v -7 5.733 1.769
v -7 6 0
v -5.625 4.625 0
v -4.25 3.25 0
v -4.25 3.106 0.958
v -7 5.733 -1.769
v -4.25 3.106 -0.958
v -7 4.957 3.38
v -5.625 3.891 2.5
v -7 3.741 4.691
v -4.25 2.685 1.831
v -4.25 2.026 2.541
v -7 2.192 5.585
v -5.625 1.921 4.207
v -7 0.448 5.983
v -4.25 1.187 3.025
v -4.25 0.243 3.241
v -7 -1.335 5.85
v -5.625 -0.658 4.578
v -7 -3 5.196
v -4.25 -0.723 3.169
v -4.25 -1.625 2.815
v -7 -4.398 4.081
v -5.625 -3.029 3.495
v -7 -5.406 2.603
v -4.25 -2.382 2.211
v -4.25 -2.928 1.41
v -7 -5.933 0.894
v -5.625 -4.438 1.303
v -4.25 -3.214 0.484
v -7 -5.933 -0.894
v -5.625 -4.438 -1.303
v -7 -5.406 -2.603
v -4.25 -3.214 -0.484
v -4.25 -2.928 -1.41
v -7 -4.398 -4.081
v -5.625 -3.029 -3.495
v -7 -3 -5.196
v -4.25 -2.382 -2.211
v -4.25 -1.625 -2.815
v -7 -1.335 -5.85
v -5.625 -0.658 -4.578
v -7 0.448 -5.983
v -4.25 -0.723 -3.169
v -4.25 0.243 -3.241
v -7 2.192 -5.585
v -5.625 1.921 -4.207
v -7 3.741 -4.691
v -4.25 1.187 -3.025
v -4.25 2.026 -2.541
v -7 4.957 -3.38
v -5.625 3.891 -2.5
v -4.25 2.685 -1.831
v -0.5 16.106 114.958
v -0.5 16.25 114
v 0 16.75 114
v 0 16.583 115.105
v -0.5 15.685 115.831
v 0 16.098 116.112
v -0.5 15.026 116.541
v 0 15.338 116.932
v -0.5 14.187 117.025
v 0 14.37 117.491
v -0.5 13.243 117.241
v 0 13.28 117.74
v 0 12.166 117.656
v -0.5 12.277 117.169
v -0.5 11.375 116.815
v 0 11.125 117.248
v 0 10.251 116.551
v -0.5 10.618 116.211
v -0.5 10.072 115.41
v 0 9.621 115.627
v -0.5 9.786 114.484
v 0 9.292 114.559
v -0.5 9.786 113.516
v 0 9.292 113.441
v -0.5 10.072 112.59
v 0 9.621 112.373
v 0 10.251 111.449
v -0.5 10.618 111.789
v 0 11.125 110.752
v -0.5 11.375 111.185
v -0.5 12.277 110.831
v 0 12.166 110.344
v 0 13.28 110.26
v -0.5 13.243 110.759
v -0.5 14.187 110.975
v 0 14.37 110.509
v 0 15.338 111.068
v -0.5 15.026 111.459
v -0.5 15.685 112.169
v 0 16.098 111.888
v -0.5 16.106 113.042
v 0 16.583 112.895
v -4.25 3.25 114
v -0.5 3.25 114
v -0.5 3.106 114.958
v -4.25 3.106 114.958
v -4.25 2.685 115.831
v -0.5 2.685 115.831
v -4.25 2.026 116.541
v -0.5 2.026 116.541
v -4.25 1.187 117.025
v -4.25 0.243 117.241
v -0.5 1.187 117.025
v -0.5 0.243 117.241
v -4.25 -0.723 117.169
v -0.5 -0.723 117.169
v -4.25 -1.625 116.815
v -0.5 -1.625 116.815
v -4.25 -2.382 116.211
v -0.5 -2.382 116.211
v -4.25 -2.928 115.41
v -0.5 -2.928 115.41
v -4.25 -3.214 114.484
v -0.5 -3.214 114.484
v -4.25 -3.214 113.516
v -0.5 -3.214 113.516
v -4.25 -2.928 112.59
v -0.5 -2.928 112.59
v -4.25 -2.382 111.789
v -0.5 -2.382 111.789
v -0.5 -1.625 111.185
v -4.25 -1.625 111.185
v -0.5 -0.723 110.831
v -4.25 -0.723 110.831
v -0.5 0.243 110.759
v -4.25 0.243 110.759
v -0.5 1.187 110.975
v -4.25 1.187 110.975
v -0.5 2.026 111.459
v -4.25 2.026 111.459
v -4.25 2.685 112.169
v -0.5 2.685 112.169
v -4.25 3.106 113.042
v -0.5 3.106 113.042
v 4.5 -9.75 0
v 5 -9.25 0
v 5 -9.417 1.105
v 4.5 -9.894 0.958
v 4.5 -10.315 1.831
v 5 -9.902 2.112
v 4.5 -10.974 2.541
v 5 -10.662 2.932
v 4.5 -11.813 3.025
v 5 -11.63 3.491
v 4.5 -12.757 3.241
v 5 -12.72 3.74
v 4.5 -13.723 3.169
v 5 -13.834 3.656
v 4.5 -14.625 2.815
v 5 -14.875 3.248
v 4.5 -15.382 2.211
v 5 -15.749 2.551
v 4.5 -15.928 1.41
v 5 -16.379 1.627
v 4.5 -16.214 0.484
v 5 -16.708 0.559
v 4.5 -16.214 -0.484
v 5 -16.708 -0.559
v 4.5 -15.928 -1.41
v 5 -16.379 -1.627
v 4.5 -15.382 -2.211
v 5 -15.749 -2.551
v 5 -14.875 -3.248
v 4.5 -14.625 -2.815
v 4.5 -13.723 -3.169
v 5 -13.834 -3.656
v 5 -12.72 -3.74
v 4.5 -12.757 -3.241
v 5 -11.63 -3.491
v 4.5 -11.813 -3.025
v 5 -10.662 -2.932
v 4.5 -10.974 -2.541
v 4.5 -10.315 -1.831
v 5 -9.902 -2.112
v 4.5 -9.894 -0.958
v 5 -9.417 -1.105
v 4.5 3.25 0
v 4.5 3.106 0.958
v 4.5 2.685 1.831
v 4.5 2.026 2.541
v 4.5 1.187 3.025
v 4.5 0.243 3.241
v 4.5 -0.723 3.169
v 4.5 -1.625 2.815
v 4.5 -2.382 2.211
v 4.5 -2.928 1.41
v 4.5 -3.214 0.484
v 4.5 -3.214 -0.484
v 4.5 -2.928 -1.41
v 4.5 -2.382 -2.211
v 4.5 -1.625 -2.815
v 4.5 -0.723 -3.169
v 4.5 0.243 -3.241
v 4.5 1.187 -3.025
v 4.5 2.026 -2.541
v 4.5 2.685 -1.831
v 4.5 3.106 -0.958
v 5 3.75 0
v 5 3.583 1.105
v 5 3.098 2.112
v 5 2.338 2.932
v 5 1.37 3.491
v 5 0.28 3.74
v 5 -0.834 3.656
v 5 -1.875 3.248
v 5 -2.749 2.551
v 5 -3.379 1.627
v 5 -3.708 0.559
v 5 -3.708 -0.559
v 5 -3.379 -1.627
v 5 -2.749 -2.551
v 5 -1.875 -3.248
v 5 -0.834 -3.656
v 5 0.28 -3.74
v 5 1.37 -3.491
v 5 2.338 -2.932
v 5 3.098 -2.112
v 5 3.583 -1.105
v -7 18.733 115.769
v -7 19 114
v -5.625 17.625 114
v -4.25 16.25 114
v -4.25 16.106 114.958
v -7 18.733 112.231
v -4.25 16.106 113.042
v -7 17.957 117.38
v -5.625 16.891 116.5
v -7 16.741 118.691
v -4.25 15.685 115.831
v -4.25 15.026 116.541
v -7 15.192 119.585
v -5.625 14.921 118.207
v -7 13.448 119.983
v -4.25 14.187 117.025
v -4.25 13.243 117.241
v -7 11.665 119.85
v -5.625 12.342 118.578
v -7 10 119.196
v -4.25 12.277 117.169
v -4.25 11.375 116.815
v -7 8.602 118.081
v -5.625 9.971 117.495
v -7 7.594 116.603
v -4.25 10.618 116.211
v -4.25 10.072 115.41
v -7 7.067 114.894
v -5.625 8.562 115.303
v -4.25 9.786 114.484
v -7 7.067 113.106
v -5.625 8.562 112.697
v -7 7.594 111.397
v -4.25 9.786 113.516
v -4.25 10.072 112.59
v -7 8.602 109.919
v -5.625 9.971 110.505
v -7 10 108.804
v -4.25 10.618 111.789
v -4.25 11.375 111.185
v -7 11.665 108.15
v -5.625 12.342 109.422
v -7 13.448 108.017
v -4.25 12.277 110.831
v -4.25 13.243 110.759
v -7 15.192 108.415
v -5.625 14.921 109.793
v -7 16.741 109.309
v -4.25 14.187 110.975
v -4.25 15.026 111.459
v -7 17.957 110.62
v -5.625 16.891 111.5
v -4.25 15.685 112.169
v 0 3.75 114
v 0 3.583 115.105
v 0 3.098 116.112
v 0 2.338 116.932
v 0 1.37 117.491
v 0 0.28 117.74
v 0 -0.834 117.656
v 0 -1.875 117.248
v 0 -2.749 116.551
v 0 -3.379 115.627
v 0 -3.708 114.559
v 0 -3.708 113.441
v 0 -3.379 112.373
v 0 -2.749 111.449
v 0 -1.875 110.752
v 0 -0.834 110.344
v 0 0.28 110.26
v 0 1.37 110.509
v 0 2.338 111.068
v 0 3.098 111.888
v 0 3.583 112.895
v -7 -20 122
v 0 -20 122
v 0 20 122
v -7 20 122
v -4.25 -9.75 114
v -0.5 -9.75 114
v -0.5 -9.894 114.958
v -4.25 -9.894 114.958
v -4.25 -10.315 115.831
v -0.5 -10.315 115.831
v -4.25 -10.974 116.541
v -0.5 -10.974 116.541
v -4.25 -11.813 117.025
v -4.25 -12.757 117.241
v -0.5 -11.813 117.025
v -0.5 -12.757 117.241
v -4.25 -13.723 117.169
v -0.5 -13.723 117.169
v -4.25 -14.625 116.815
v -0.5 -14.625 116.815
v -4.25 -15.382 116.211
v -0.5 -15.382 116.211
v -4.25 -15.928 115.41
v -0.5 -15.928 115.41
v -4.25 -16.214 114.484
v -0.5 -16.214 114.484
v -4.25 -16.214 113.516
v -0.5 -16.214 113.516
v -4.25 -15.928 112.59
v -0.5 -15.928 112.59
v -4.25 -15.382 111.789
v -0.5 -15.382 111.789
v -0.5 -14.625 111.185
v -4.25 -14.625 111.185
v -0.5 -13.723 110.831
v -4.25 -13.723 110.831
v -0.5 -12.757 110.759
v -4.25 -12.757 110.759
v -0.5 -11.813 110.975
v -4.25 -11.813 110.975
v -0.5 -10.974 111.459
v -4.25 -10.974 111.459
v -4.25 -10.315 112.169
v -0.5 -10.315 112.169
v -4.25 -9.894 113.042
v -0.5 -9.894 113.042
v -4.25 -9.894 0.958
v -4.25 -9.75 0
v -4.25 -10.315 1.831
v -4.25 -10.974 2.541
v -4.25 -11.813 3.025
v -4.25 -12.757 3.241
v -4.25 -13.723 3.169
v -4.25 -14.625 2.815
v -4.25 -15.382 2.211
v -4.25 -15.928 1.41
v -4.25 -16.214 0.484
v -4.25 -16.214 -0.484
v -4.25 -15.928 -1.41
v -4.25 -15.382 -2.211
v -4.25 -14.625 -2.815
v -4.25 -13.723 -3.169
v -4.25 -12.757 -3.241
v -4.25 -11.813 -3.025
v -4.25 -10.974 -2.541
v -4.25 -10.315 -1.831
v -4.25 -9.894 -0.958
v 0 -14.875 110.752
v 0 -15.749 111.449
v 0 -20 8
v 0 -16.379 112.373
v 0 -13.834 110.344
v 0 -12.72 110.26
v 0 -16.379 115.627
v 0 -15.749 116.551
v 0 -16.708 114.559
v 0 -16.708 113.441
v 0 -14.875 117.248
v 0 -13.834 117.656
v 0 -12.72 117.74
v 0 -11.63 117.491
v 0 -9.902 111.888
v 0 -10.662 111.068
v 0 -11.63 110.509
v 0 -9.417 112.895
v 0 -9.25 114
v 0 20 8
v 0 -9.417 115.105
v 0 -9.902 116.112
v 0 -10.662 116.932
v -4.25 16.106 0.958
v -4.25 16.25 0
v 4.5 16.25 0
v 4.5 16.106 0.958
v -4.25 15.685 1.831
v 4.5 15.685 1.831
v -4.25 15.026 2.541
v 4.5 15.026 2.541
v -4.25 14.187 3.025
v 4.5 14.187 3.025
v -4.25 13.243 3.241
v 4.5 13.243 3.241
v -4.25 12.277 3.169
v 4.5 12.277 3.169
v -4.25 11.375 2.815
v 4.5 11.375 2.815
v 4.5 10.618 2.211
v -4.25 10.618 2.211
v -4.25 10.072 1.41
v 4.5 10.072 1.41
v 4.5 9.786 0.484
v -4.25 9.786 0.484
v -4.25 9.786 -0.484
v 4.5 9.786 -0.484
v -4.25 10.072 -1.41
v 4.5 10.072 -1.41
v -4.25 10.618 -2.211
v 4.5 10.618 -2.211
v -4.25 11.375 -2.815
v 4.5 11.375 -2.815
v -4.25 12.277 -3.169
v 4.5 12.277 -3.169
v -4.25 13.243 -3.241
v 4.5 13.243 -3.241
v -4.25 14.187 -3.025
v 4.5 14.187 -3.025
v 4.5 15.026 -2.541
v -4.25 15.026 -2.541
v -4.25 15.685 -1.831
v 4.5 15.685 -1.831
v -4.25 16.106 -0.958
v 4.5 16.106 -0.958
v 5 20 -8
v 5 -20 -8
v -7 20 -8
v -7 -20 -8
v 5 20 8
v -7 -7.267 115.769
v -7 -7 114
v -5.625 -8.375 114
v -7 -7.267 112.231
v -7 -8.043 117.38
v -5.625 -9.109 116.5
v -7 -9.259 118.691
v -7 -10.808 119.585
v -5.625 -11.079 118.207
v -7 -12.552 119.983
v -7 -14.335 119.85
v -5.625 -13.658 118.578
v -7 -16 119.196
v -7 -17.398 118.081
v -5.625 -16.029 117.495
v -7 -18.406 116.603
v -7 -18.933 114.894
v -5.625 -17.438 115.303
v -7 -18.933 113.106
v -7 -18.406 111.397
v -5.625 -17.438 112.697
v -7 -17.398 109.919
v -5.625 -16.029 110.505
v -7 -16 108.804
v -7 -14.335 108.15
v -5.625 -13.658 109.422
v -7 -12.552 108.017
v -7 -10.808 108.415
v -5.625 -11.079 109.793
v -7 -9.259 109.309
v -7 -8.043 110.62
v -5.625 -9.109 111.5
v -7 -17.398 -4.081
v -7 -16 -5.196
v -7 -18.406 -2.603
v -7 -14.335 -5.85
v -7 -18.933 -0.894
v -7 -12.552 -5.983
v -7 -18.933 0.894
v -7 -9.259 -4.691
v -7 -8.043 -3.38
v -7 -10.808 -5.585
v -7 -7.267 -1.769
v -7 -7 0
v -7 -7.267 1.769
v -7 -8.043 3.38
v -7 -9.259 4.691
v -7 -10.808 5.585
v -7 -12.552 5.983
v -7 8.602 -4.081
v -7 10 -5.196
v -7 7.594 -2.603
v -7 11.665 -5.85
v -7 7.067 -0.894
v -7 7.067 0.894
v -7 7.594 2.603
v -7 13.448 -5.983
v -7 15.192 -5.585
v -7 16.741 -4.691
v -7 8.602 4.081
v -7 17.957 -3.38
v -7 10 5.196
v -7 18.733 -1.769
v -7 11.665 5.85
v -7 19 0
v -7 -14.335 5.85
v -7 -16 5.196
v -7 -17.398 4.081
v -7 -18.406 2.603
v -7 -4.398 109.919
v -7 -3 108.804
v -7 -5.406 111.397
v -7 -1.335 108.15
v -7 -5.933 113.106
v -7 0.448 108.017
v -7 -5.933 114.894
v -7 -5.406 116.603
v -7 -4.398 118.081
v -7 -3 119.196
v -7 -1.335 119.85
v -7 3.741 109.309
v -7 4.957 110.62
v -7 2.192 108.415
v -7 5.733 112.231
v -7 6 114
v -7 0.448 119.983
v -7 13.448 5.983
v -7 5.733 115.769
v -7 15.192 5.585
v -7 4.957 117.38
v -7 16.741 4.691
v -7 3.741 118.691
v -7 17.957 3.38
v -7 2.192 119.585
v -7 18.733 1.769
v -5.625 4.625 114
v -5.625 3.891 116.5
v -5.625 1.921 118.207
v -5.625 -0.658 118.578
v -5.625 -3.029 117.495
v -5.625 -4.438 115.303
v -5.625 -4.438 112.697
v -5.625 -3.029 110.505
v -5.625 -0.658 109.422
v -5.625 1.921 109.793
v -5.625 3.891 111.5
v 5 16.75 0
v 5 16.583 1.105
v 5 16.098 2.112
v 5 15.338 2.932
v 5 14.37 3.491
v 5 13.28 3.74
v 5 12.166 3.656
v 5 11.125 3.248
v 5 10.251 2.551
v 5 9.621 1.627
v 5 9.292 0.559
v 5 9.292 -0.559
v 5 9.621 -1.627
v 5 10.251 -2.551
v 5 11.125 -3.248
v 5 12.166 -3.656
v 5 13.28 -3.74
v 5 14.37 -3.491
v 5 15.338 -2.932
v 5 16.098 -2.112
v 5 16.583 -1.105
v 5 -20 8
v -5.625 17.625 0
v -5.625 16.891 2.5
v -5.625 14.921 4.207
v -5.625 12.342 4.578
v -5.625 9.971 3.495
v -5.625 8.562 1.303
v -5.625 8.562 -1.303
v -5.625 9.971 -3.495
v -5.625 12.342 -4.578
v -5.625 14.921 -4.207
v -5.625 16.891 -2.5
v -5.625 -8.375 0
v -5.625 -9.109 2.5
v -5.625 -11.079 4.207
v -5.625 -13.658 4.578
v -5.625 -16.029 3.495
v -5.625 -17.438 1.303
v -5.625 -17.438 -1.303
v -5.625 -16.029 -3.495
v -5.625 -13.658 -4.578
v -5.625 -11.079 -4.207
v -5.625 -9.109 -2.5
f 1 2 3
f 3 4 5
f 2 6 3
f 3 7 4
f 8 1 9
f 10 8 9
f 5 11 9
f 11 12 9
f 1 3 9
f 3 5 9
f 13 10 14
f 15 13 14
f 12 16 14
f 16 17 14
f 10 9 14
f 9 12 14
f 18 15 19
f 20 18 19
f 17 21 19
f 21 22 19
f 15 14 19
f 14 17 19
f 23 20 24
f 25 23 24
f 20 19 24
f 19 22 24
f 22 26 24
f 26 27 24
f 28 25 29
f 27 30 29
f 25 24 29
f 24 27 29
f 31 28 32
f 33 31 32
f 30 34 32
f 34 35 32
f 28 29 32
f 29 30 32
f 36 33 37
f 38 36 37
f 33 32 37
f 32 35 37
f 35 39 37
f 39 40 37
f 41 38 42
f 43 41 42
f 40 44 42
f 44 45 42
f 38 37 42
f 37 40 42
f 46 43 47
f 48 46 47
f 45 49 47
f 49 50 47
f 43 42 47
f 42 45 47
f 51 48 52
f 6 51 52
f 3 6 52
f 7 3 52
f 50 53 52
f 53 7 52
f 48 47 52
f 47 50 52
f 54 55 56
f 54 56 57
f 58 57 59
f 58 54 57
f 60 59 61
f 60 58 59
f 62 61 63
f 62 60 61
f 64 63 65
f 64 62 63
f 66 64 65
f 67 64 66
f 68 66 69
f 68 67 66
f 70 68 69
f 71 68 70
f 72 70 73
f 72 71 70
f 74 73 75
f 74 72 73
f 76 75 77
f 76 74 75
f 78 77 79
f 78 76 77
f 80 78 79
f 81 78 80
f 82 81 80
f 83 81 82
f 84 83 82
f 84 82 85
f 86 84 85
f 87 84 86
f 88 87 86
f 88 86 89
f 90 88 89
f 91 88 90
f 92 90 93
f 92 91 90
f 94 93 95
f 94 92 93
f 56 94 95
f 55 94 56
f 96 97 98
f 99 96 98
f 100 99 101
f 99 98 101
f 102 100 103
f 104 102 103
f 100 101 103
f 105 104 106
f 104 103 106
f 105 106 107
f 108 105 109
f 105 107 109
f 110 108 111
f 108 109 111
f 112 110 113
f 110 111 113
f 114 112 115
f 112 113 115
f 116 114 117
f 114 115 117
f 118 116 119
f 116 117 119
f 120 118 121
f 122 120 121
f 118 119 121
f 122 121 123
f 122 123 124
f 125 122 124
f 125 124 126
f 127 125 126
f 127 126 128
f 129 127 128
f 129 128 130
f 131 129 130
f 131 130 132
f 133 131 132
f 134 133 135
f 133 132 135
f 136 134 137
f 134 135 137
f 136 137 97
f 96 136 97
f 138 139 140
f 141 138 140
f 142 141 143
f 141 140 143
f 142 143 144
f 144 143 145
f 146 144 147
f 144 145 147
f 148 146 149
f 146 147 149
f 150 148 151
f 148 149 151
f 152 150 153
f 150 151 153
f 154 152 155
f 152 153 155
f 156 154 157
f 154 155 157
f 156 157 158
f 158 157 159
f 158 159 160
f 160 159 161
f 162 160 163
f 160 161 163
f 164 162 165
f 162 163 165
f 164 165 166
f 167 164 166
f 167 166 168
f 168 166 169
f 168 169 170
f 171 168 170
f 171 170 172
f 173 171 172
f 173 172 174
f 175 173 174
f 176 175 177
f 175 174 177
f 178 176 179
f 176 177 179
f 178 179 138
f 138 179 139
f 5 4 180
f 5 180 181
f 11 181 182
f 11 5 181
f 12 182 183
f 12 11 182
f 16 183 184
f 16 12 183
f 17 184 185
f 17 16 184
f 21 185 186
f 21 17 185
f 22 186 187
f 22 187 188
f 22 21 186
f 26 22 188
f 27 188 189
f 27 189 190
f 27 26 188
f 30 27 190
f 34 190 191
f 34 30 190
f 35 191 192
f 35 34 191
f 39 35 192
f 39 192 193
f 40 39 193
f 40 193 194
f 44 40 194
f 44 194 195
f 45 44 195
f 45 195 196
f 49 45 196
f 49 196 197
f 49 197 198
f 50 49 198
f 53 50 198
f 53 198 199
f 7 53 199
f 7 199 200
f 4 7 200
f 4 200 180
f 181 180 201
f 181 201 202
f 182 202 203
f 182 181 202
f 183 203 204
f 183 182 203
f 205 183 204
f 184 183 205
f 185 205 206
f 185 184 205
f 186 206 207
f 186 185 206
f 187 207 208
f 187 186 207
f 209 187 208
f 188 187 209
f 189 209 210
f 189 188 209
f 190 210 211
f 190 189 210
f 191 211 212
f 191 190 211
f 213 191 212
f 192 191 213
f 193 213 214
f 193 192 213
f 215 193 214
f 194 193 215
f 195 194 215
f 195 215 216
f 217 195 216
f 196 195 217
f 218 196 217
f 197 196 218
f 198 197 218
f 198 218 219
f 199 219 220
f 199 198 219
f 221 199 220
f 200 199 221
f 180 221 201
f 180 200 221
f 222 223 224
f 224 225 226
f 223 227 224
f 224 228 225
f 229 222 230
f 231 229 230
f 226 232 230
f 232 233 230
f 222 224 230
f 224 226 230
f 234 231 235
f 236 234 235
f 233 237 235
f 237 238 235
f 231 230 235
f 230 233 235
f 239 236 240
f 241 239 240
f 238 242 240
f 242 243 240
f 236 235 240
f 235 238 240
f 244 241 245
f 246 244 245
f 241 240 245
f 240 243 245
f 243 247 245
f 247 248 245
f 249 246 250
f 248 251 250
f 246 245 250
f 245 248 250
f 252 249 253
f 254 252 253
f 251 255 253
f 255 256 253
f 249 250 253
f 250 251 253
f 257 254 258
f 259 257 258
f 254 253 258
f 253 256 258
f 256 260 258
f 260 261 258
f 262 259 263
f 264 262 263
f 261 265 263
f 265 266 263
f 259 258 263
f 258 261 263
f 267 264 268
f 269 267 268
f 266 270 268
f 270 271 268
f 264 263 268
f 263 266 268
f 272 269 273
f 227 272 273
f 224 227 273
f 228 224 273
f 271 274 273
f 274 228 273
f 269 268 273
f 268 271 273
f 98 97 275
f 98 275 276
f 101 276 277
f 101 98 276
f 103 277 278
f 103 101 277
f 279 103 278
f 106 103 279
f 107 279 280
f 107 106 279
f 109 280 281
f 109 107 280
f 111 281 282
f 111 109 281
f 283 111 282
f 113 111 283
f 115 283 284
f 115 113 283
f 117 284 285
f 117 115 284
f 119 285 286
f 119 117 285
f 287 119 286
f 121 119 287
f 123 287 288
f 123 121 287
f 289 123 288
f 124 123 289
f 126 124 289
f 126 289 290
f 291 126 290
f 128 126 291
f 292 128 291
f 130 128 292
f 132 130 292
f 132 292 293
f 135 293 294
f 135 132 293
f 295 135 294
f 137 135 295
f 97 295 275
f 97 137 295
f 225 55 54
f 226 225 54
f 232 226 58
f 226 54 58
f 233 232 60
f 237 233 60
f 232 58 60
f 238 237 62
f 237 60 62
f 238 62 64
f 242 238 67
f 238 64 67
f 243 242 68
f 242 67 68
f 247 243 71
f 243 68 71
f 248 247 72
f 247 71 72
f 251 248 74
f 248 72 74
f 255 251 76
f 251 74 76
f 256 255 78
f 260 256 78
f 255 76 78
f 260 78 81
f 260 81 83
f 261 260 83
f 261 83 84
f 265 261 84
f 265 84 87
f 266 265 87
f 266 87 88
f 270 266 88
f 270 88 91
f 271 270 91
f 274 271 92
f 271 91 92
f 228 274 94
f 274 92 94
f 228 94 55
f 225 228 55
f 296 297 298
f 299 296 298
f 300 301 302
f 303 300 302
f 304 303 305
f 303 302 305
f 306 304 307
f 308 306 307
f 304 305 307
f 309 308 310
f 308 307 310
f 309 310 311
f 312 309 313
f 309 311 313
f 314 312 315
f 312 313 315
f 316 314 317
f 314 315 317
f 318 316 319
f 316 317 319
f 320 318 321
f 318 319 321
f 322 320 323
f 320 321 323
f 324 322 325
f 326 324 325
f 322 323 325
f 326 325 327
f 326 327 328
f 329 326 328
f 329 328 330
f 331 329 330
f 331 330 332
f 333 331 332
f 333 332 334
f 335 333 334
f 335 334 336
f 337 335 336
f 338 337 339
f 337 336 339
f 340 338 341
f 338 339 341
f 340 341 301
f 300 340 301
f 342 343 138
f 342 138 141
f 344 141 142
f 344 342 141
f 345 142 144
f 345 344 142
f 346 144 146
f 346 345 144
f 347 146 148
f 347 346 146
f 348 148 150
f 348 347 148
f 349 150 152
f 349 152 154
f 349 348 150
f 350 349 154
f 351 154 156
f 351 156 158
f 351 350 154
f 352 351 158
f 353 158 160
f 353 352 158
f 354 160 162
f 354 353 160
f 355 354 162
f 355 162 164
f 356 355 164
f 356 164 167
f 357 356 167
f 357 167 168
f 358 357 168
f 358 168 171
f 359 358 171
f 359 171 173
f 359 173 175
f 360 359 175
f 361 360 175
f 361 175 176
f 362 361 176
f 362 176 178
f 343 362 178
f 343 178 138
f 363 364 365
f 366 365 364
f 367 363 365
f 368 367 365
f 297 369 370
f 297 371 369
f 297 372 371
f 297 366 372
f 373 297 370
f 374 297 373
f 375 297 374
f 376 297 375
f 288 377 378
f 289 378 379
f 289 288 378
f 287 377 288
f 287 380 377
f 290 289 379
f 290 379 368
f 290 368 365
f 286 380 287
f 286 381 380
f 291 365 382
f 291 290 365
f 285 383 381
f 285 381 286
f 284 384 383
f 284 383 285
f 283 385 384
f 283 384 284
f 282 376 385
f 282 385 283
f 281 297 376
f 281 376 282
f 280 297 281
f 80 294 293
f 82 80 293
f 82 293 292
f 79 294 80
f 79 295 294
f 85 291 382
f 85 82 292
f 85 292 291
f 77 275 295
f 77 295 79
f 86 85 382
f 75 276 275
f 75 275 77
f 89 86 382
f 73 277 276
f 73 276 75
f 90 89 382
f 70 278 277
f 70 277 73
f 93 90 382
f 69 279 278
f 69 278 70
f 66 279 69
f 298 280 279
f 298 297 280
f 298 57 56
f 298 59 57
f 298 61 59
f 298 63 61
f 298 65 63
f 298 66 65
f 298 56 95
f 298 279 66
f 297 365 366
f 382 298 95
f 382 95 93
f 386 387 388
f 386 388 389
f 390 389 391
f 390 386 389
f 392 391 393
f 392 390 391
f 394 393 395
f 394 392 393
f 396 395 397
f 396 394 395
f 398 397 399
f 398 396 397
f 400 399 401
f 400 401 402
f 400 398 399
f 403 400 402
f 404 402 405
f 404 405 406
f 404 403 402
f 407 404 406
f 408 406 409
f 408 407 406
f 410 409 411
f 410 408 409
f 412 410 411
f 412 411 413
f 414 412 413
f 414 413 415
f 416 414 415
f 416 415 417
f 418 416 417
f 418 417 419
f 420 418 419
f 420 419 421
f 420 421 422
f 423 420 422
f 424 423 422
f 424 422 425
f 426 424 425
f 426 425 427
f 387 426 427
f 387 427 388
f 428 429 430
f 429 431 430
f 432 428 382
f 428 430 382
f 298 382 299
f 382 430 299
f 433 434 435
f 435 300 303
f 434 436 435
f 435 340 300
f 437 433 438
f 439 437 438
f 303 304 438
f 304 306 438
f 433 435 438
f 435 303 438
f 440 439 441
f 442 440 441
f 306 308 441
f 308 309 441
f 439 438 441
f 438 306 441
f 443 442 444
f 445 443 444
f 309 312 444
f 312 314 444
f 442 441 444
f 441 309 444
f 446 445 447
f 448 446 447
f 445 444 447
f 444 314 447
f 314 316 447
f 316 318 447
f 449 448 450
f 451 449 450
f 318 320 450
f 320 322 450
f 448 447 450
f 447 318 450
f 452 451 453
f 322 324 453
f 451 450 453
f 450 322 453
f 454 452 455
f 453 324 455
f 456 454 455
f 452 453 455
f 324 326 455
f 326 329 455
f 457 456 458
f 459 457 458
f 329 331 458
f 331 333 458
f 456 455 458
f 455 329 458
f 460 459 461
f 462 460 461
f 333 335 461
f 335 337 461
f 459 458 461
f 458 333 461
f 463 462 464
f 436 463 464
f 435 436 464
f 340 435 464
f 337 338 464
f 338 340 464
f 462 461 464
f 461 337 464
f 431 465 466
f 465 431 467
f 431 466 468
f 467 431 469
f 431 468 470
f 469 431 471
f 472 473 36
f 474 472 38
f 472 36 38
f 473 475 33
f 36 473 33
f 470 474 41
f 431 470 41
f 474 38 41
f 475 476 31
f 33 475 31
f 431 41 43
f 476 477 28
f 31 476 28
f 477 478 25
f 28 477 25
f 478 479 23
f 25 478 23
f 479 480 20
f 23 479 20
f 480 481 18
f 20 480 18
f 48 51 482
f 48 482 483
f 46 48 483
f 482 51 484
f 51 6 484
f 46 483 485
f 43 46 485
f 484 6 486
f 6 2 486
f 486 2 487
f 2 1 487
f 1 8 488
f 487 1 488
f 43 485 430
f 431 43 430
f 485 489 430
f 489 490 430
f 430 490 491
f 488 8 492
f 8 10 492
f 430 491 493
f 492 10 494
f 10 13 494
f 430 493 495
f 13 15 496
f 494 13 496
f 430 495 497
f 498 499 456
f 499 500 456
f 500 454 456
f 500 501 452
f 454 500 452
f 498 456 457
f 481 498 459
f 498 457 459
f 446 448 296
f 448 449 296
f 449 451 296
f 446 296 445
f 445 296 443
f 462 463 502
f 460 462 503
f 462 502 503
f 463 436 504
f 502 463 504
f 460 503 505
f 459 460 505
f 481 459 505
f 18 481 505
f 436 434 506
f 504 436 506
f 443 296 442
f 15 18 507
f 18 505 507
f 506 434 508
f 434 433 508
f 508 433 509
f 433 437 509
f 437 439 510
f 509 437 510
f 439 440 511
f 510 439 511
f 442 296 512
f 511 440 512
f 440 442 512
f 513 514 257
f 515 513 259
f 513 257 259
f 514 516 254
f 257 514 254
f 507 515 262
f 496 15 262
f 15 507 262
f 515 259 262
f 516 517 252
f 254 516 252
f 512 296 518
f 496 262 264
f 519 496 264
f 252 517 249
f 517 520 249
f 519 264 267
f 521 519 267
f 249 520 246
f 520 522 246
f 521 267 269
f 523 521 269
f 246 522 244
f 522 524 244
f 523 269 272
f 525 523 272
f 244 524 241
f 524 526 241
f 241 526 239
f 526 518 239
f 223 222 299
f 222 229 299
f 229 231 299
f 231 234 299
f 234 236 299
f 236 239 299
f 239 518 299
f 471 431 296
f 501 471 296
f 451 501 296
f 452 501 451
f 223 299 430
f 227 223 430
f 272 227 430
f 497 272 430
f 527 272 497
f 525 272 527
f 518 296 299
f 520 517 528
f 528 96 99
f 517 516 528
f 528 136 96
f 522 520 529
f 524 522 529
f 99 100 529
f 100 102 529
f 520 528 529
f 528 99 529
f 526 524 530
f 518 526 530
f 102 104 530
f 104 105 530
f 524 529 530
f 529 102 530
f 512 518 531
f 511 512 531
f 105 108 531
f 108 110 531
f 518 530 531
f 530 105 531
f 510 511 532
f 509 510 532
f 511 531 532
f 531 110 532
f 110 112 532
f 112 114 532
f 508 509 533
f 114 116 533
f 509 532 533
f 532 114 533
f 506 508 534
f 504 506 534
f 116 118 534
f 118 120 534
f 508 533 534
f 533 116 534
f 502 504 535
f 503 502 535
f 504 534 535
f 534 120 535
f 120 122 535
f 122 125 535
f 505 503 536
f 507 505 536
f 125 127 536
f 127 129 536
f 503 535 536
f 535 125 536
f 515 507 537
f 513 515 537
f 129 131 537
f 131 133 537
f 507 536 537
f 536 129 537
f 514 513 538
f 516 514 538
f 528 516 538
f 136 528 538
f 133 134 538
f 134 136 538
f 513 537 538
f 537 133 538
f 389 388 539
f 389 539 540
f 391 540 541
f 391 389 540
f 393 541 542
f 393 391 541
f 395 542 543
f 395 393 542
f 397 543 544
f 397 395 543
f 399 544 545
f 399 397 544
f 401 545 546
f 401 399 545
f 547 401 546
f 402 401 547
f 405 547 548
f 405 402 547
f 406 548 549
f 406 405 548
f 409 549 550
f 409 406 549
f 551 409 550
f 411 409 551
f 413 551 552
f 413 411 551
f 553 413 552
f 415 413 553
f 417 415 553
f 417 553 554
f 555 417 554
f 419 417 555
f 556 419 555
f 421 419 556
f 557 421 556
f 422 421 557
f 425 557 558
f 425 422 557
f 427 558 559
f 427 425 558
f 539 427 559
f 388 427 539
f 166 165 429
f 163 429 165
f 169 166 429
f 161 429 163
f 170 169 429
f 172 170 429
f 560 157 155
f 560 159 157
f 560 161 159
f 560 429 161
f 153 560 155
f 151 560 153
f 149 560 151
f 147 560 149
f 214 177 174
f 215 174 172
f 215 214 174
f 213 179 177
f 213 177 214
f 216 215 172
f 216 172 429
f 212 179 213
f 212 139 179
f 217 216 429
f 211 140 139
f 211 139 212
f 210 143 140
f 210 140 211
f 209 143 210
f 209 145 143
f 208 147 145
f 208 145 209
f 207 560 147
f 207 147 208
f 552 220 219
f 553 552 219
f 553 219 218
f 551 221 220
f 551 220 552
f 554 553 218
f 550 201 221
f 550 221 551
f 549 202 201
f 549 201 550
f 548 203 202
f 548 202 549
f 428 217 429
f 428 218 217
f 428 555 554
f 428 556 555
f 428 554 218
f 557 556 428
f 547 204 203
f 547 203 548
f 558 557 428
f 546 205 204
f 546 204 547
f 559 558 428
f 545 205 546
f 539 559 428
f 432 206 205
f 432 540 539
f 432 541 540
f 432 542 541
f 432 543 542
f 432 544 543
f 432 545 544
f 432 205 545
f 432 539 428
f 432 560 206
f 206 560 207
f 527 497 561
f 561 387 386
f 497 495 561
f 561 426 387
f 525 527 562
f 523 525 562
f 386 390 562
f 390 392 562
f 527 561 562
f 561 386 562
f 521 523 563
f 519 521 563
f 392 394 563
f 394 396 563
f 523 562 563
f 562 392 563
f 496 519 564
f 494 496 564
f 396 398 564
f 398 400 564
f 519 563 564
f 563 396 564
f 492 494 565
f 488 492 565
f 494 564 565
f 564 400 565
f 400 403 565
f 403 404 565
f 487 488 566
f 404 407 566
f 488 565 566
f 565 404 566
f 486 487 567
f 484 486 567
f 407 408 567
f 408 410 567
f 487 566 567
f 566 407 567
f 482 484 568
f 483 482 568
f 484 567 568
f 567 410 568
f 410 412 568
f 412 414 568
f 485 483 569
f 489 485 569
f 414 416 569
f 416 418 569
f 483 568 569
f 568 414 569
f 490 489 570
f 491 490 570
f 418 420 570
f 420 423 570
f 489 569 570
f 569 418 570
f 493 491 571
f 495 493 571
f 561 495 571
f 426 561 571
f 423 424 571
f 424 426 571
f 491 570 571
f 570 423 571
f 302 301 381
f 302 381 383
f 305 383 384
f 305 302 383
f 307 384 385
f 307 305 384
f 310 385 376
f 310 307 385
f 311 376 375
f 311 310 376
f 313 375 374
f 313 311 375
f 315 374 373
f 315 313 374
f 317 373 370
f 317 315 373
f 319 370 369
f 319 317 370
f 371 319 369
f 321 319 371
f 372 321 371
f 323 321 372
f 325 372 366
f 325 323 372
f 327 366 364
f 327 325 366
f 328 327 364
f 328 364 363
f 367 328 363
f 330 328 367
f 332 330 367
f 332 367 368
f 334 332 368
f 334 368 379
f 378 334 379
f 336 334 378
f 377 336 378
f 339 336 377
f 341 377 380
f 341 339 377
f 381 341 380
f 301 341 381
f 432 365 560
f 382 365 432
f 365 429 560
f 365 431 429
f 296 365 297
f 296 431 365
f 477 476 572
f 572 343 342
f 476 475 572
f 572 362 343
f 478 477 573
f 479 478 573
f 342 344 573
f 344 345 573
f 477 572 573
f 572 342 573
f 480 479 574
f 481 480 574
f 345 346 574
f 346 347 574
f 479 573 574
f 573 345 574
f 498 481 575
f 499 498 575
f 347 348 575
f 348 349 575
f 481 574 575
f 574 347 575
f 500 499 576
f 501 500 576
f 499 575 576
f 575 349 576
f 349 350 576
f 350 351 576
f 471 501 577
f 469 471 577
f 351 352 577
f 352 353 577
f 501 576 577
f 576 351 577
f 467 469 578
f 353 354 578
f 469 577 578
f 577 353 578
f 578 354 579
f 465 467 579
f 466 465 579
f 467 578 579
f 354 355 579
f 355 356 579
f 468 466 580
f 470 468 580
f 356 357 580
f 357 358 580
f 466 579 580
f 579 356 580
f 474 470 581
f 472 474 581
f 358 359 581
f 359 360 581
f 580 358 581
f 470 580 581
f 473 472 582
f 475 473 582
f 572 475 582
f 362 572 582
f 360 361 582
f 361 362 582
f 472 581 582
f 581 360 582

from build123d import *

# Parameters (mm, degrees)
F0_W     = 40
F0_H     = 130
F0_R     = 3.25
F1_DEPTH = 7
F2_W     = 40
F2_H     = 16
F2_R     = 3.25
F3_DEPTH = 5
F4_SIZE  = 2.75
F5_SIZE  = 0.5


with BuildPart() as f1:
    # F0 (on Right) → F1 (new body)
    with BuildSketch(Plane.YZ):
        with Locations((0, 57)):
            Rectangle(F0_W, F0_H)
        with Locations((-13, 0)):
            Circle(F0_R, mode=Mode.SUBTRACT)
        Circle(F0_R, mode=Mode.SUBTRACT)
        with Locations((13, 0)):
            Circle(F0_R, mode=Mode.SUBTRACT)
        with Locations((-13, 114)):
            Circle(F0_R, mode=Mode.SUBTRACT)
        with Locations((0, 114)):
            Circle(F0_R, mode=Mode.SUBTRACT)
        with Locations((13, 114)):
            Circle(F0_R, mode=Mode.SUBTRACT)
    extrude(amount=-F1_DEPTH)

    # F2 (on face) → F3 (join)
    with BuildSketch(Plane.YZ):
        Rectangle(F2_W, F2_H)
        with Locations((-13, 0)):
            Circle(F2_R, mode=Mode.SUBTRACT)
        Circle(F2_R, mode=Mode.SUBTRACT)
        with Locations((13, 0)):
            Circle(F2_R, mode=Mode.SUBTRACT)
    extrude(amount=F3_DEPTH)

    # F4
    f4_edges = [f1.edges().sort_by_distance(p)[0] for p in [
        (-7, -16.25, 0),
        (-7, -3.25, 0),
        (-7, 9.75, 0),
        (-7, 9.75, 114),
        (-7, -3.25, 114),
        (-7, -16.25, 114),
    ]]
    chamfer(f4_edges, length=F4_SIZE)

    # F5
    f5_edges = [f1.edges().sort_by_distance(p)[0] for p in [
        (5, -16.25, 0),
        (5, -3.25, 0),
        (5, 9.75, 0),
        (0, -16.25, 114),
        (0, -3.25, 114),
        (0, 9.75, 114),
    ]]
    chamfer(f5_edges, length=F5_SIZE)


solid = f1.part
